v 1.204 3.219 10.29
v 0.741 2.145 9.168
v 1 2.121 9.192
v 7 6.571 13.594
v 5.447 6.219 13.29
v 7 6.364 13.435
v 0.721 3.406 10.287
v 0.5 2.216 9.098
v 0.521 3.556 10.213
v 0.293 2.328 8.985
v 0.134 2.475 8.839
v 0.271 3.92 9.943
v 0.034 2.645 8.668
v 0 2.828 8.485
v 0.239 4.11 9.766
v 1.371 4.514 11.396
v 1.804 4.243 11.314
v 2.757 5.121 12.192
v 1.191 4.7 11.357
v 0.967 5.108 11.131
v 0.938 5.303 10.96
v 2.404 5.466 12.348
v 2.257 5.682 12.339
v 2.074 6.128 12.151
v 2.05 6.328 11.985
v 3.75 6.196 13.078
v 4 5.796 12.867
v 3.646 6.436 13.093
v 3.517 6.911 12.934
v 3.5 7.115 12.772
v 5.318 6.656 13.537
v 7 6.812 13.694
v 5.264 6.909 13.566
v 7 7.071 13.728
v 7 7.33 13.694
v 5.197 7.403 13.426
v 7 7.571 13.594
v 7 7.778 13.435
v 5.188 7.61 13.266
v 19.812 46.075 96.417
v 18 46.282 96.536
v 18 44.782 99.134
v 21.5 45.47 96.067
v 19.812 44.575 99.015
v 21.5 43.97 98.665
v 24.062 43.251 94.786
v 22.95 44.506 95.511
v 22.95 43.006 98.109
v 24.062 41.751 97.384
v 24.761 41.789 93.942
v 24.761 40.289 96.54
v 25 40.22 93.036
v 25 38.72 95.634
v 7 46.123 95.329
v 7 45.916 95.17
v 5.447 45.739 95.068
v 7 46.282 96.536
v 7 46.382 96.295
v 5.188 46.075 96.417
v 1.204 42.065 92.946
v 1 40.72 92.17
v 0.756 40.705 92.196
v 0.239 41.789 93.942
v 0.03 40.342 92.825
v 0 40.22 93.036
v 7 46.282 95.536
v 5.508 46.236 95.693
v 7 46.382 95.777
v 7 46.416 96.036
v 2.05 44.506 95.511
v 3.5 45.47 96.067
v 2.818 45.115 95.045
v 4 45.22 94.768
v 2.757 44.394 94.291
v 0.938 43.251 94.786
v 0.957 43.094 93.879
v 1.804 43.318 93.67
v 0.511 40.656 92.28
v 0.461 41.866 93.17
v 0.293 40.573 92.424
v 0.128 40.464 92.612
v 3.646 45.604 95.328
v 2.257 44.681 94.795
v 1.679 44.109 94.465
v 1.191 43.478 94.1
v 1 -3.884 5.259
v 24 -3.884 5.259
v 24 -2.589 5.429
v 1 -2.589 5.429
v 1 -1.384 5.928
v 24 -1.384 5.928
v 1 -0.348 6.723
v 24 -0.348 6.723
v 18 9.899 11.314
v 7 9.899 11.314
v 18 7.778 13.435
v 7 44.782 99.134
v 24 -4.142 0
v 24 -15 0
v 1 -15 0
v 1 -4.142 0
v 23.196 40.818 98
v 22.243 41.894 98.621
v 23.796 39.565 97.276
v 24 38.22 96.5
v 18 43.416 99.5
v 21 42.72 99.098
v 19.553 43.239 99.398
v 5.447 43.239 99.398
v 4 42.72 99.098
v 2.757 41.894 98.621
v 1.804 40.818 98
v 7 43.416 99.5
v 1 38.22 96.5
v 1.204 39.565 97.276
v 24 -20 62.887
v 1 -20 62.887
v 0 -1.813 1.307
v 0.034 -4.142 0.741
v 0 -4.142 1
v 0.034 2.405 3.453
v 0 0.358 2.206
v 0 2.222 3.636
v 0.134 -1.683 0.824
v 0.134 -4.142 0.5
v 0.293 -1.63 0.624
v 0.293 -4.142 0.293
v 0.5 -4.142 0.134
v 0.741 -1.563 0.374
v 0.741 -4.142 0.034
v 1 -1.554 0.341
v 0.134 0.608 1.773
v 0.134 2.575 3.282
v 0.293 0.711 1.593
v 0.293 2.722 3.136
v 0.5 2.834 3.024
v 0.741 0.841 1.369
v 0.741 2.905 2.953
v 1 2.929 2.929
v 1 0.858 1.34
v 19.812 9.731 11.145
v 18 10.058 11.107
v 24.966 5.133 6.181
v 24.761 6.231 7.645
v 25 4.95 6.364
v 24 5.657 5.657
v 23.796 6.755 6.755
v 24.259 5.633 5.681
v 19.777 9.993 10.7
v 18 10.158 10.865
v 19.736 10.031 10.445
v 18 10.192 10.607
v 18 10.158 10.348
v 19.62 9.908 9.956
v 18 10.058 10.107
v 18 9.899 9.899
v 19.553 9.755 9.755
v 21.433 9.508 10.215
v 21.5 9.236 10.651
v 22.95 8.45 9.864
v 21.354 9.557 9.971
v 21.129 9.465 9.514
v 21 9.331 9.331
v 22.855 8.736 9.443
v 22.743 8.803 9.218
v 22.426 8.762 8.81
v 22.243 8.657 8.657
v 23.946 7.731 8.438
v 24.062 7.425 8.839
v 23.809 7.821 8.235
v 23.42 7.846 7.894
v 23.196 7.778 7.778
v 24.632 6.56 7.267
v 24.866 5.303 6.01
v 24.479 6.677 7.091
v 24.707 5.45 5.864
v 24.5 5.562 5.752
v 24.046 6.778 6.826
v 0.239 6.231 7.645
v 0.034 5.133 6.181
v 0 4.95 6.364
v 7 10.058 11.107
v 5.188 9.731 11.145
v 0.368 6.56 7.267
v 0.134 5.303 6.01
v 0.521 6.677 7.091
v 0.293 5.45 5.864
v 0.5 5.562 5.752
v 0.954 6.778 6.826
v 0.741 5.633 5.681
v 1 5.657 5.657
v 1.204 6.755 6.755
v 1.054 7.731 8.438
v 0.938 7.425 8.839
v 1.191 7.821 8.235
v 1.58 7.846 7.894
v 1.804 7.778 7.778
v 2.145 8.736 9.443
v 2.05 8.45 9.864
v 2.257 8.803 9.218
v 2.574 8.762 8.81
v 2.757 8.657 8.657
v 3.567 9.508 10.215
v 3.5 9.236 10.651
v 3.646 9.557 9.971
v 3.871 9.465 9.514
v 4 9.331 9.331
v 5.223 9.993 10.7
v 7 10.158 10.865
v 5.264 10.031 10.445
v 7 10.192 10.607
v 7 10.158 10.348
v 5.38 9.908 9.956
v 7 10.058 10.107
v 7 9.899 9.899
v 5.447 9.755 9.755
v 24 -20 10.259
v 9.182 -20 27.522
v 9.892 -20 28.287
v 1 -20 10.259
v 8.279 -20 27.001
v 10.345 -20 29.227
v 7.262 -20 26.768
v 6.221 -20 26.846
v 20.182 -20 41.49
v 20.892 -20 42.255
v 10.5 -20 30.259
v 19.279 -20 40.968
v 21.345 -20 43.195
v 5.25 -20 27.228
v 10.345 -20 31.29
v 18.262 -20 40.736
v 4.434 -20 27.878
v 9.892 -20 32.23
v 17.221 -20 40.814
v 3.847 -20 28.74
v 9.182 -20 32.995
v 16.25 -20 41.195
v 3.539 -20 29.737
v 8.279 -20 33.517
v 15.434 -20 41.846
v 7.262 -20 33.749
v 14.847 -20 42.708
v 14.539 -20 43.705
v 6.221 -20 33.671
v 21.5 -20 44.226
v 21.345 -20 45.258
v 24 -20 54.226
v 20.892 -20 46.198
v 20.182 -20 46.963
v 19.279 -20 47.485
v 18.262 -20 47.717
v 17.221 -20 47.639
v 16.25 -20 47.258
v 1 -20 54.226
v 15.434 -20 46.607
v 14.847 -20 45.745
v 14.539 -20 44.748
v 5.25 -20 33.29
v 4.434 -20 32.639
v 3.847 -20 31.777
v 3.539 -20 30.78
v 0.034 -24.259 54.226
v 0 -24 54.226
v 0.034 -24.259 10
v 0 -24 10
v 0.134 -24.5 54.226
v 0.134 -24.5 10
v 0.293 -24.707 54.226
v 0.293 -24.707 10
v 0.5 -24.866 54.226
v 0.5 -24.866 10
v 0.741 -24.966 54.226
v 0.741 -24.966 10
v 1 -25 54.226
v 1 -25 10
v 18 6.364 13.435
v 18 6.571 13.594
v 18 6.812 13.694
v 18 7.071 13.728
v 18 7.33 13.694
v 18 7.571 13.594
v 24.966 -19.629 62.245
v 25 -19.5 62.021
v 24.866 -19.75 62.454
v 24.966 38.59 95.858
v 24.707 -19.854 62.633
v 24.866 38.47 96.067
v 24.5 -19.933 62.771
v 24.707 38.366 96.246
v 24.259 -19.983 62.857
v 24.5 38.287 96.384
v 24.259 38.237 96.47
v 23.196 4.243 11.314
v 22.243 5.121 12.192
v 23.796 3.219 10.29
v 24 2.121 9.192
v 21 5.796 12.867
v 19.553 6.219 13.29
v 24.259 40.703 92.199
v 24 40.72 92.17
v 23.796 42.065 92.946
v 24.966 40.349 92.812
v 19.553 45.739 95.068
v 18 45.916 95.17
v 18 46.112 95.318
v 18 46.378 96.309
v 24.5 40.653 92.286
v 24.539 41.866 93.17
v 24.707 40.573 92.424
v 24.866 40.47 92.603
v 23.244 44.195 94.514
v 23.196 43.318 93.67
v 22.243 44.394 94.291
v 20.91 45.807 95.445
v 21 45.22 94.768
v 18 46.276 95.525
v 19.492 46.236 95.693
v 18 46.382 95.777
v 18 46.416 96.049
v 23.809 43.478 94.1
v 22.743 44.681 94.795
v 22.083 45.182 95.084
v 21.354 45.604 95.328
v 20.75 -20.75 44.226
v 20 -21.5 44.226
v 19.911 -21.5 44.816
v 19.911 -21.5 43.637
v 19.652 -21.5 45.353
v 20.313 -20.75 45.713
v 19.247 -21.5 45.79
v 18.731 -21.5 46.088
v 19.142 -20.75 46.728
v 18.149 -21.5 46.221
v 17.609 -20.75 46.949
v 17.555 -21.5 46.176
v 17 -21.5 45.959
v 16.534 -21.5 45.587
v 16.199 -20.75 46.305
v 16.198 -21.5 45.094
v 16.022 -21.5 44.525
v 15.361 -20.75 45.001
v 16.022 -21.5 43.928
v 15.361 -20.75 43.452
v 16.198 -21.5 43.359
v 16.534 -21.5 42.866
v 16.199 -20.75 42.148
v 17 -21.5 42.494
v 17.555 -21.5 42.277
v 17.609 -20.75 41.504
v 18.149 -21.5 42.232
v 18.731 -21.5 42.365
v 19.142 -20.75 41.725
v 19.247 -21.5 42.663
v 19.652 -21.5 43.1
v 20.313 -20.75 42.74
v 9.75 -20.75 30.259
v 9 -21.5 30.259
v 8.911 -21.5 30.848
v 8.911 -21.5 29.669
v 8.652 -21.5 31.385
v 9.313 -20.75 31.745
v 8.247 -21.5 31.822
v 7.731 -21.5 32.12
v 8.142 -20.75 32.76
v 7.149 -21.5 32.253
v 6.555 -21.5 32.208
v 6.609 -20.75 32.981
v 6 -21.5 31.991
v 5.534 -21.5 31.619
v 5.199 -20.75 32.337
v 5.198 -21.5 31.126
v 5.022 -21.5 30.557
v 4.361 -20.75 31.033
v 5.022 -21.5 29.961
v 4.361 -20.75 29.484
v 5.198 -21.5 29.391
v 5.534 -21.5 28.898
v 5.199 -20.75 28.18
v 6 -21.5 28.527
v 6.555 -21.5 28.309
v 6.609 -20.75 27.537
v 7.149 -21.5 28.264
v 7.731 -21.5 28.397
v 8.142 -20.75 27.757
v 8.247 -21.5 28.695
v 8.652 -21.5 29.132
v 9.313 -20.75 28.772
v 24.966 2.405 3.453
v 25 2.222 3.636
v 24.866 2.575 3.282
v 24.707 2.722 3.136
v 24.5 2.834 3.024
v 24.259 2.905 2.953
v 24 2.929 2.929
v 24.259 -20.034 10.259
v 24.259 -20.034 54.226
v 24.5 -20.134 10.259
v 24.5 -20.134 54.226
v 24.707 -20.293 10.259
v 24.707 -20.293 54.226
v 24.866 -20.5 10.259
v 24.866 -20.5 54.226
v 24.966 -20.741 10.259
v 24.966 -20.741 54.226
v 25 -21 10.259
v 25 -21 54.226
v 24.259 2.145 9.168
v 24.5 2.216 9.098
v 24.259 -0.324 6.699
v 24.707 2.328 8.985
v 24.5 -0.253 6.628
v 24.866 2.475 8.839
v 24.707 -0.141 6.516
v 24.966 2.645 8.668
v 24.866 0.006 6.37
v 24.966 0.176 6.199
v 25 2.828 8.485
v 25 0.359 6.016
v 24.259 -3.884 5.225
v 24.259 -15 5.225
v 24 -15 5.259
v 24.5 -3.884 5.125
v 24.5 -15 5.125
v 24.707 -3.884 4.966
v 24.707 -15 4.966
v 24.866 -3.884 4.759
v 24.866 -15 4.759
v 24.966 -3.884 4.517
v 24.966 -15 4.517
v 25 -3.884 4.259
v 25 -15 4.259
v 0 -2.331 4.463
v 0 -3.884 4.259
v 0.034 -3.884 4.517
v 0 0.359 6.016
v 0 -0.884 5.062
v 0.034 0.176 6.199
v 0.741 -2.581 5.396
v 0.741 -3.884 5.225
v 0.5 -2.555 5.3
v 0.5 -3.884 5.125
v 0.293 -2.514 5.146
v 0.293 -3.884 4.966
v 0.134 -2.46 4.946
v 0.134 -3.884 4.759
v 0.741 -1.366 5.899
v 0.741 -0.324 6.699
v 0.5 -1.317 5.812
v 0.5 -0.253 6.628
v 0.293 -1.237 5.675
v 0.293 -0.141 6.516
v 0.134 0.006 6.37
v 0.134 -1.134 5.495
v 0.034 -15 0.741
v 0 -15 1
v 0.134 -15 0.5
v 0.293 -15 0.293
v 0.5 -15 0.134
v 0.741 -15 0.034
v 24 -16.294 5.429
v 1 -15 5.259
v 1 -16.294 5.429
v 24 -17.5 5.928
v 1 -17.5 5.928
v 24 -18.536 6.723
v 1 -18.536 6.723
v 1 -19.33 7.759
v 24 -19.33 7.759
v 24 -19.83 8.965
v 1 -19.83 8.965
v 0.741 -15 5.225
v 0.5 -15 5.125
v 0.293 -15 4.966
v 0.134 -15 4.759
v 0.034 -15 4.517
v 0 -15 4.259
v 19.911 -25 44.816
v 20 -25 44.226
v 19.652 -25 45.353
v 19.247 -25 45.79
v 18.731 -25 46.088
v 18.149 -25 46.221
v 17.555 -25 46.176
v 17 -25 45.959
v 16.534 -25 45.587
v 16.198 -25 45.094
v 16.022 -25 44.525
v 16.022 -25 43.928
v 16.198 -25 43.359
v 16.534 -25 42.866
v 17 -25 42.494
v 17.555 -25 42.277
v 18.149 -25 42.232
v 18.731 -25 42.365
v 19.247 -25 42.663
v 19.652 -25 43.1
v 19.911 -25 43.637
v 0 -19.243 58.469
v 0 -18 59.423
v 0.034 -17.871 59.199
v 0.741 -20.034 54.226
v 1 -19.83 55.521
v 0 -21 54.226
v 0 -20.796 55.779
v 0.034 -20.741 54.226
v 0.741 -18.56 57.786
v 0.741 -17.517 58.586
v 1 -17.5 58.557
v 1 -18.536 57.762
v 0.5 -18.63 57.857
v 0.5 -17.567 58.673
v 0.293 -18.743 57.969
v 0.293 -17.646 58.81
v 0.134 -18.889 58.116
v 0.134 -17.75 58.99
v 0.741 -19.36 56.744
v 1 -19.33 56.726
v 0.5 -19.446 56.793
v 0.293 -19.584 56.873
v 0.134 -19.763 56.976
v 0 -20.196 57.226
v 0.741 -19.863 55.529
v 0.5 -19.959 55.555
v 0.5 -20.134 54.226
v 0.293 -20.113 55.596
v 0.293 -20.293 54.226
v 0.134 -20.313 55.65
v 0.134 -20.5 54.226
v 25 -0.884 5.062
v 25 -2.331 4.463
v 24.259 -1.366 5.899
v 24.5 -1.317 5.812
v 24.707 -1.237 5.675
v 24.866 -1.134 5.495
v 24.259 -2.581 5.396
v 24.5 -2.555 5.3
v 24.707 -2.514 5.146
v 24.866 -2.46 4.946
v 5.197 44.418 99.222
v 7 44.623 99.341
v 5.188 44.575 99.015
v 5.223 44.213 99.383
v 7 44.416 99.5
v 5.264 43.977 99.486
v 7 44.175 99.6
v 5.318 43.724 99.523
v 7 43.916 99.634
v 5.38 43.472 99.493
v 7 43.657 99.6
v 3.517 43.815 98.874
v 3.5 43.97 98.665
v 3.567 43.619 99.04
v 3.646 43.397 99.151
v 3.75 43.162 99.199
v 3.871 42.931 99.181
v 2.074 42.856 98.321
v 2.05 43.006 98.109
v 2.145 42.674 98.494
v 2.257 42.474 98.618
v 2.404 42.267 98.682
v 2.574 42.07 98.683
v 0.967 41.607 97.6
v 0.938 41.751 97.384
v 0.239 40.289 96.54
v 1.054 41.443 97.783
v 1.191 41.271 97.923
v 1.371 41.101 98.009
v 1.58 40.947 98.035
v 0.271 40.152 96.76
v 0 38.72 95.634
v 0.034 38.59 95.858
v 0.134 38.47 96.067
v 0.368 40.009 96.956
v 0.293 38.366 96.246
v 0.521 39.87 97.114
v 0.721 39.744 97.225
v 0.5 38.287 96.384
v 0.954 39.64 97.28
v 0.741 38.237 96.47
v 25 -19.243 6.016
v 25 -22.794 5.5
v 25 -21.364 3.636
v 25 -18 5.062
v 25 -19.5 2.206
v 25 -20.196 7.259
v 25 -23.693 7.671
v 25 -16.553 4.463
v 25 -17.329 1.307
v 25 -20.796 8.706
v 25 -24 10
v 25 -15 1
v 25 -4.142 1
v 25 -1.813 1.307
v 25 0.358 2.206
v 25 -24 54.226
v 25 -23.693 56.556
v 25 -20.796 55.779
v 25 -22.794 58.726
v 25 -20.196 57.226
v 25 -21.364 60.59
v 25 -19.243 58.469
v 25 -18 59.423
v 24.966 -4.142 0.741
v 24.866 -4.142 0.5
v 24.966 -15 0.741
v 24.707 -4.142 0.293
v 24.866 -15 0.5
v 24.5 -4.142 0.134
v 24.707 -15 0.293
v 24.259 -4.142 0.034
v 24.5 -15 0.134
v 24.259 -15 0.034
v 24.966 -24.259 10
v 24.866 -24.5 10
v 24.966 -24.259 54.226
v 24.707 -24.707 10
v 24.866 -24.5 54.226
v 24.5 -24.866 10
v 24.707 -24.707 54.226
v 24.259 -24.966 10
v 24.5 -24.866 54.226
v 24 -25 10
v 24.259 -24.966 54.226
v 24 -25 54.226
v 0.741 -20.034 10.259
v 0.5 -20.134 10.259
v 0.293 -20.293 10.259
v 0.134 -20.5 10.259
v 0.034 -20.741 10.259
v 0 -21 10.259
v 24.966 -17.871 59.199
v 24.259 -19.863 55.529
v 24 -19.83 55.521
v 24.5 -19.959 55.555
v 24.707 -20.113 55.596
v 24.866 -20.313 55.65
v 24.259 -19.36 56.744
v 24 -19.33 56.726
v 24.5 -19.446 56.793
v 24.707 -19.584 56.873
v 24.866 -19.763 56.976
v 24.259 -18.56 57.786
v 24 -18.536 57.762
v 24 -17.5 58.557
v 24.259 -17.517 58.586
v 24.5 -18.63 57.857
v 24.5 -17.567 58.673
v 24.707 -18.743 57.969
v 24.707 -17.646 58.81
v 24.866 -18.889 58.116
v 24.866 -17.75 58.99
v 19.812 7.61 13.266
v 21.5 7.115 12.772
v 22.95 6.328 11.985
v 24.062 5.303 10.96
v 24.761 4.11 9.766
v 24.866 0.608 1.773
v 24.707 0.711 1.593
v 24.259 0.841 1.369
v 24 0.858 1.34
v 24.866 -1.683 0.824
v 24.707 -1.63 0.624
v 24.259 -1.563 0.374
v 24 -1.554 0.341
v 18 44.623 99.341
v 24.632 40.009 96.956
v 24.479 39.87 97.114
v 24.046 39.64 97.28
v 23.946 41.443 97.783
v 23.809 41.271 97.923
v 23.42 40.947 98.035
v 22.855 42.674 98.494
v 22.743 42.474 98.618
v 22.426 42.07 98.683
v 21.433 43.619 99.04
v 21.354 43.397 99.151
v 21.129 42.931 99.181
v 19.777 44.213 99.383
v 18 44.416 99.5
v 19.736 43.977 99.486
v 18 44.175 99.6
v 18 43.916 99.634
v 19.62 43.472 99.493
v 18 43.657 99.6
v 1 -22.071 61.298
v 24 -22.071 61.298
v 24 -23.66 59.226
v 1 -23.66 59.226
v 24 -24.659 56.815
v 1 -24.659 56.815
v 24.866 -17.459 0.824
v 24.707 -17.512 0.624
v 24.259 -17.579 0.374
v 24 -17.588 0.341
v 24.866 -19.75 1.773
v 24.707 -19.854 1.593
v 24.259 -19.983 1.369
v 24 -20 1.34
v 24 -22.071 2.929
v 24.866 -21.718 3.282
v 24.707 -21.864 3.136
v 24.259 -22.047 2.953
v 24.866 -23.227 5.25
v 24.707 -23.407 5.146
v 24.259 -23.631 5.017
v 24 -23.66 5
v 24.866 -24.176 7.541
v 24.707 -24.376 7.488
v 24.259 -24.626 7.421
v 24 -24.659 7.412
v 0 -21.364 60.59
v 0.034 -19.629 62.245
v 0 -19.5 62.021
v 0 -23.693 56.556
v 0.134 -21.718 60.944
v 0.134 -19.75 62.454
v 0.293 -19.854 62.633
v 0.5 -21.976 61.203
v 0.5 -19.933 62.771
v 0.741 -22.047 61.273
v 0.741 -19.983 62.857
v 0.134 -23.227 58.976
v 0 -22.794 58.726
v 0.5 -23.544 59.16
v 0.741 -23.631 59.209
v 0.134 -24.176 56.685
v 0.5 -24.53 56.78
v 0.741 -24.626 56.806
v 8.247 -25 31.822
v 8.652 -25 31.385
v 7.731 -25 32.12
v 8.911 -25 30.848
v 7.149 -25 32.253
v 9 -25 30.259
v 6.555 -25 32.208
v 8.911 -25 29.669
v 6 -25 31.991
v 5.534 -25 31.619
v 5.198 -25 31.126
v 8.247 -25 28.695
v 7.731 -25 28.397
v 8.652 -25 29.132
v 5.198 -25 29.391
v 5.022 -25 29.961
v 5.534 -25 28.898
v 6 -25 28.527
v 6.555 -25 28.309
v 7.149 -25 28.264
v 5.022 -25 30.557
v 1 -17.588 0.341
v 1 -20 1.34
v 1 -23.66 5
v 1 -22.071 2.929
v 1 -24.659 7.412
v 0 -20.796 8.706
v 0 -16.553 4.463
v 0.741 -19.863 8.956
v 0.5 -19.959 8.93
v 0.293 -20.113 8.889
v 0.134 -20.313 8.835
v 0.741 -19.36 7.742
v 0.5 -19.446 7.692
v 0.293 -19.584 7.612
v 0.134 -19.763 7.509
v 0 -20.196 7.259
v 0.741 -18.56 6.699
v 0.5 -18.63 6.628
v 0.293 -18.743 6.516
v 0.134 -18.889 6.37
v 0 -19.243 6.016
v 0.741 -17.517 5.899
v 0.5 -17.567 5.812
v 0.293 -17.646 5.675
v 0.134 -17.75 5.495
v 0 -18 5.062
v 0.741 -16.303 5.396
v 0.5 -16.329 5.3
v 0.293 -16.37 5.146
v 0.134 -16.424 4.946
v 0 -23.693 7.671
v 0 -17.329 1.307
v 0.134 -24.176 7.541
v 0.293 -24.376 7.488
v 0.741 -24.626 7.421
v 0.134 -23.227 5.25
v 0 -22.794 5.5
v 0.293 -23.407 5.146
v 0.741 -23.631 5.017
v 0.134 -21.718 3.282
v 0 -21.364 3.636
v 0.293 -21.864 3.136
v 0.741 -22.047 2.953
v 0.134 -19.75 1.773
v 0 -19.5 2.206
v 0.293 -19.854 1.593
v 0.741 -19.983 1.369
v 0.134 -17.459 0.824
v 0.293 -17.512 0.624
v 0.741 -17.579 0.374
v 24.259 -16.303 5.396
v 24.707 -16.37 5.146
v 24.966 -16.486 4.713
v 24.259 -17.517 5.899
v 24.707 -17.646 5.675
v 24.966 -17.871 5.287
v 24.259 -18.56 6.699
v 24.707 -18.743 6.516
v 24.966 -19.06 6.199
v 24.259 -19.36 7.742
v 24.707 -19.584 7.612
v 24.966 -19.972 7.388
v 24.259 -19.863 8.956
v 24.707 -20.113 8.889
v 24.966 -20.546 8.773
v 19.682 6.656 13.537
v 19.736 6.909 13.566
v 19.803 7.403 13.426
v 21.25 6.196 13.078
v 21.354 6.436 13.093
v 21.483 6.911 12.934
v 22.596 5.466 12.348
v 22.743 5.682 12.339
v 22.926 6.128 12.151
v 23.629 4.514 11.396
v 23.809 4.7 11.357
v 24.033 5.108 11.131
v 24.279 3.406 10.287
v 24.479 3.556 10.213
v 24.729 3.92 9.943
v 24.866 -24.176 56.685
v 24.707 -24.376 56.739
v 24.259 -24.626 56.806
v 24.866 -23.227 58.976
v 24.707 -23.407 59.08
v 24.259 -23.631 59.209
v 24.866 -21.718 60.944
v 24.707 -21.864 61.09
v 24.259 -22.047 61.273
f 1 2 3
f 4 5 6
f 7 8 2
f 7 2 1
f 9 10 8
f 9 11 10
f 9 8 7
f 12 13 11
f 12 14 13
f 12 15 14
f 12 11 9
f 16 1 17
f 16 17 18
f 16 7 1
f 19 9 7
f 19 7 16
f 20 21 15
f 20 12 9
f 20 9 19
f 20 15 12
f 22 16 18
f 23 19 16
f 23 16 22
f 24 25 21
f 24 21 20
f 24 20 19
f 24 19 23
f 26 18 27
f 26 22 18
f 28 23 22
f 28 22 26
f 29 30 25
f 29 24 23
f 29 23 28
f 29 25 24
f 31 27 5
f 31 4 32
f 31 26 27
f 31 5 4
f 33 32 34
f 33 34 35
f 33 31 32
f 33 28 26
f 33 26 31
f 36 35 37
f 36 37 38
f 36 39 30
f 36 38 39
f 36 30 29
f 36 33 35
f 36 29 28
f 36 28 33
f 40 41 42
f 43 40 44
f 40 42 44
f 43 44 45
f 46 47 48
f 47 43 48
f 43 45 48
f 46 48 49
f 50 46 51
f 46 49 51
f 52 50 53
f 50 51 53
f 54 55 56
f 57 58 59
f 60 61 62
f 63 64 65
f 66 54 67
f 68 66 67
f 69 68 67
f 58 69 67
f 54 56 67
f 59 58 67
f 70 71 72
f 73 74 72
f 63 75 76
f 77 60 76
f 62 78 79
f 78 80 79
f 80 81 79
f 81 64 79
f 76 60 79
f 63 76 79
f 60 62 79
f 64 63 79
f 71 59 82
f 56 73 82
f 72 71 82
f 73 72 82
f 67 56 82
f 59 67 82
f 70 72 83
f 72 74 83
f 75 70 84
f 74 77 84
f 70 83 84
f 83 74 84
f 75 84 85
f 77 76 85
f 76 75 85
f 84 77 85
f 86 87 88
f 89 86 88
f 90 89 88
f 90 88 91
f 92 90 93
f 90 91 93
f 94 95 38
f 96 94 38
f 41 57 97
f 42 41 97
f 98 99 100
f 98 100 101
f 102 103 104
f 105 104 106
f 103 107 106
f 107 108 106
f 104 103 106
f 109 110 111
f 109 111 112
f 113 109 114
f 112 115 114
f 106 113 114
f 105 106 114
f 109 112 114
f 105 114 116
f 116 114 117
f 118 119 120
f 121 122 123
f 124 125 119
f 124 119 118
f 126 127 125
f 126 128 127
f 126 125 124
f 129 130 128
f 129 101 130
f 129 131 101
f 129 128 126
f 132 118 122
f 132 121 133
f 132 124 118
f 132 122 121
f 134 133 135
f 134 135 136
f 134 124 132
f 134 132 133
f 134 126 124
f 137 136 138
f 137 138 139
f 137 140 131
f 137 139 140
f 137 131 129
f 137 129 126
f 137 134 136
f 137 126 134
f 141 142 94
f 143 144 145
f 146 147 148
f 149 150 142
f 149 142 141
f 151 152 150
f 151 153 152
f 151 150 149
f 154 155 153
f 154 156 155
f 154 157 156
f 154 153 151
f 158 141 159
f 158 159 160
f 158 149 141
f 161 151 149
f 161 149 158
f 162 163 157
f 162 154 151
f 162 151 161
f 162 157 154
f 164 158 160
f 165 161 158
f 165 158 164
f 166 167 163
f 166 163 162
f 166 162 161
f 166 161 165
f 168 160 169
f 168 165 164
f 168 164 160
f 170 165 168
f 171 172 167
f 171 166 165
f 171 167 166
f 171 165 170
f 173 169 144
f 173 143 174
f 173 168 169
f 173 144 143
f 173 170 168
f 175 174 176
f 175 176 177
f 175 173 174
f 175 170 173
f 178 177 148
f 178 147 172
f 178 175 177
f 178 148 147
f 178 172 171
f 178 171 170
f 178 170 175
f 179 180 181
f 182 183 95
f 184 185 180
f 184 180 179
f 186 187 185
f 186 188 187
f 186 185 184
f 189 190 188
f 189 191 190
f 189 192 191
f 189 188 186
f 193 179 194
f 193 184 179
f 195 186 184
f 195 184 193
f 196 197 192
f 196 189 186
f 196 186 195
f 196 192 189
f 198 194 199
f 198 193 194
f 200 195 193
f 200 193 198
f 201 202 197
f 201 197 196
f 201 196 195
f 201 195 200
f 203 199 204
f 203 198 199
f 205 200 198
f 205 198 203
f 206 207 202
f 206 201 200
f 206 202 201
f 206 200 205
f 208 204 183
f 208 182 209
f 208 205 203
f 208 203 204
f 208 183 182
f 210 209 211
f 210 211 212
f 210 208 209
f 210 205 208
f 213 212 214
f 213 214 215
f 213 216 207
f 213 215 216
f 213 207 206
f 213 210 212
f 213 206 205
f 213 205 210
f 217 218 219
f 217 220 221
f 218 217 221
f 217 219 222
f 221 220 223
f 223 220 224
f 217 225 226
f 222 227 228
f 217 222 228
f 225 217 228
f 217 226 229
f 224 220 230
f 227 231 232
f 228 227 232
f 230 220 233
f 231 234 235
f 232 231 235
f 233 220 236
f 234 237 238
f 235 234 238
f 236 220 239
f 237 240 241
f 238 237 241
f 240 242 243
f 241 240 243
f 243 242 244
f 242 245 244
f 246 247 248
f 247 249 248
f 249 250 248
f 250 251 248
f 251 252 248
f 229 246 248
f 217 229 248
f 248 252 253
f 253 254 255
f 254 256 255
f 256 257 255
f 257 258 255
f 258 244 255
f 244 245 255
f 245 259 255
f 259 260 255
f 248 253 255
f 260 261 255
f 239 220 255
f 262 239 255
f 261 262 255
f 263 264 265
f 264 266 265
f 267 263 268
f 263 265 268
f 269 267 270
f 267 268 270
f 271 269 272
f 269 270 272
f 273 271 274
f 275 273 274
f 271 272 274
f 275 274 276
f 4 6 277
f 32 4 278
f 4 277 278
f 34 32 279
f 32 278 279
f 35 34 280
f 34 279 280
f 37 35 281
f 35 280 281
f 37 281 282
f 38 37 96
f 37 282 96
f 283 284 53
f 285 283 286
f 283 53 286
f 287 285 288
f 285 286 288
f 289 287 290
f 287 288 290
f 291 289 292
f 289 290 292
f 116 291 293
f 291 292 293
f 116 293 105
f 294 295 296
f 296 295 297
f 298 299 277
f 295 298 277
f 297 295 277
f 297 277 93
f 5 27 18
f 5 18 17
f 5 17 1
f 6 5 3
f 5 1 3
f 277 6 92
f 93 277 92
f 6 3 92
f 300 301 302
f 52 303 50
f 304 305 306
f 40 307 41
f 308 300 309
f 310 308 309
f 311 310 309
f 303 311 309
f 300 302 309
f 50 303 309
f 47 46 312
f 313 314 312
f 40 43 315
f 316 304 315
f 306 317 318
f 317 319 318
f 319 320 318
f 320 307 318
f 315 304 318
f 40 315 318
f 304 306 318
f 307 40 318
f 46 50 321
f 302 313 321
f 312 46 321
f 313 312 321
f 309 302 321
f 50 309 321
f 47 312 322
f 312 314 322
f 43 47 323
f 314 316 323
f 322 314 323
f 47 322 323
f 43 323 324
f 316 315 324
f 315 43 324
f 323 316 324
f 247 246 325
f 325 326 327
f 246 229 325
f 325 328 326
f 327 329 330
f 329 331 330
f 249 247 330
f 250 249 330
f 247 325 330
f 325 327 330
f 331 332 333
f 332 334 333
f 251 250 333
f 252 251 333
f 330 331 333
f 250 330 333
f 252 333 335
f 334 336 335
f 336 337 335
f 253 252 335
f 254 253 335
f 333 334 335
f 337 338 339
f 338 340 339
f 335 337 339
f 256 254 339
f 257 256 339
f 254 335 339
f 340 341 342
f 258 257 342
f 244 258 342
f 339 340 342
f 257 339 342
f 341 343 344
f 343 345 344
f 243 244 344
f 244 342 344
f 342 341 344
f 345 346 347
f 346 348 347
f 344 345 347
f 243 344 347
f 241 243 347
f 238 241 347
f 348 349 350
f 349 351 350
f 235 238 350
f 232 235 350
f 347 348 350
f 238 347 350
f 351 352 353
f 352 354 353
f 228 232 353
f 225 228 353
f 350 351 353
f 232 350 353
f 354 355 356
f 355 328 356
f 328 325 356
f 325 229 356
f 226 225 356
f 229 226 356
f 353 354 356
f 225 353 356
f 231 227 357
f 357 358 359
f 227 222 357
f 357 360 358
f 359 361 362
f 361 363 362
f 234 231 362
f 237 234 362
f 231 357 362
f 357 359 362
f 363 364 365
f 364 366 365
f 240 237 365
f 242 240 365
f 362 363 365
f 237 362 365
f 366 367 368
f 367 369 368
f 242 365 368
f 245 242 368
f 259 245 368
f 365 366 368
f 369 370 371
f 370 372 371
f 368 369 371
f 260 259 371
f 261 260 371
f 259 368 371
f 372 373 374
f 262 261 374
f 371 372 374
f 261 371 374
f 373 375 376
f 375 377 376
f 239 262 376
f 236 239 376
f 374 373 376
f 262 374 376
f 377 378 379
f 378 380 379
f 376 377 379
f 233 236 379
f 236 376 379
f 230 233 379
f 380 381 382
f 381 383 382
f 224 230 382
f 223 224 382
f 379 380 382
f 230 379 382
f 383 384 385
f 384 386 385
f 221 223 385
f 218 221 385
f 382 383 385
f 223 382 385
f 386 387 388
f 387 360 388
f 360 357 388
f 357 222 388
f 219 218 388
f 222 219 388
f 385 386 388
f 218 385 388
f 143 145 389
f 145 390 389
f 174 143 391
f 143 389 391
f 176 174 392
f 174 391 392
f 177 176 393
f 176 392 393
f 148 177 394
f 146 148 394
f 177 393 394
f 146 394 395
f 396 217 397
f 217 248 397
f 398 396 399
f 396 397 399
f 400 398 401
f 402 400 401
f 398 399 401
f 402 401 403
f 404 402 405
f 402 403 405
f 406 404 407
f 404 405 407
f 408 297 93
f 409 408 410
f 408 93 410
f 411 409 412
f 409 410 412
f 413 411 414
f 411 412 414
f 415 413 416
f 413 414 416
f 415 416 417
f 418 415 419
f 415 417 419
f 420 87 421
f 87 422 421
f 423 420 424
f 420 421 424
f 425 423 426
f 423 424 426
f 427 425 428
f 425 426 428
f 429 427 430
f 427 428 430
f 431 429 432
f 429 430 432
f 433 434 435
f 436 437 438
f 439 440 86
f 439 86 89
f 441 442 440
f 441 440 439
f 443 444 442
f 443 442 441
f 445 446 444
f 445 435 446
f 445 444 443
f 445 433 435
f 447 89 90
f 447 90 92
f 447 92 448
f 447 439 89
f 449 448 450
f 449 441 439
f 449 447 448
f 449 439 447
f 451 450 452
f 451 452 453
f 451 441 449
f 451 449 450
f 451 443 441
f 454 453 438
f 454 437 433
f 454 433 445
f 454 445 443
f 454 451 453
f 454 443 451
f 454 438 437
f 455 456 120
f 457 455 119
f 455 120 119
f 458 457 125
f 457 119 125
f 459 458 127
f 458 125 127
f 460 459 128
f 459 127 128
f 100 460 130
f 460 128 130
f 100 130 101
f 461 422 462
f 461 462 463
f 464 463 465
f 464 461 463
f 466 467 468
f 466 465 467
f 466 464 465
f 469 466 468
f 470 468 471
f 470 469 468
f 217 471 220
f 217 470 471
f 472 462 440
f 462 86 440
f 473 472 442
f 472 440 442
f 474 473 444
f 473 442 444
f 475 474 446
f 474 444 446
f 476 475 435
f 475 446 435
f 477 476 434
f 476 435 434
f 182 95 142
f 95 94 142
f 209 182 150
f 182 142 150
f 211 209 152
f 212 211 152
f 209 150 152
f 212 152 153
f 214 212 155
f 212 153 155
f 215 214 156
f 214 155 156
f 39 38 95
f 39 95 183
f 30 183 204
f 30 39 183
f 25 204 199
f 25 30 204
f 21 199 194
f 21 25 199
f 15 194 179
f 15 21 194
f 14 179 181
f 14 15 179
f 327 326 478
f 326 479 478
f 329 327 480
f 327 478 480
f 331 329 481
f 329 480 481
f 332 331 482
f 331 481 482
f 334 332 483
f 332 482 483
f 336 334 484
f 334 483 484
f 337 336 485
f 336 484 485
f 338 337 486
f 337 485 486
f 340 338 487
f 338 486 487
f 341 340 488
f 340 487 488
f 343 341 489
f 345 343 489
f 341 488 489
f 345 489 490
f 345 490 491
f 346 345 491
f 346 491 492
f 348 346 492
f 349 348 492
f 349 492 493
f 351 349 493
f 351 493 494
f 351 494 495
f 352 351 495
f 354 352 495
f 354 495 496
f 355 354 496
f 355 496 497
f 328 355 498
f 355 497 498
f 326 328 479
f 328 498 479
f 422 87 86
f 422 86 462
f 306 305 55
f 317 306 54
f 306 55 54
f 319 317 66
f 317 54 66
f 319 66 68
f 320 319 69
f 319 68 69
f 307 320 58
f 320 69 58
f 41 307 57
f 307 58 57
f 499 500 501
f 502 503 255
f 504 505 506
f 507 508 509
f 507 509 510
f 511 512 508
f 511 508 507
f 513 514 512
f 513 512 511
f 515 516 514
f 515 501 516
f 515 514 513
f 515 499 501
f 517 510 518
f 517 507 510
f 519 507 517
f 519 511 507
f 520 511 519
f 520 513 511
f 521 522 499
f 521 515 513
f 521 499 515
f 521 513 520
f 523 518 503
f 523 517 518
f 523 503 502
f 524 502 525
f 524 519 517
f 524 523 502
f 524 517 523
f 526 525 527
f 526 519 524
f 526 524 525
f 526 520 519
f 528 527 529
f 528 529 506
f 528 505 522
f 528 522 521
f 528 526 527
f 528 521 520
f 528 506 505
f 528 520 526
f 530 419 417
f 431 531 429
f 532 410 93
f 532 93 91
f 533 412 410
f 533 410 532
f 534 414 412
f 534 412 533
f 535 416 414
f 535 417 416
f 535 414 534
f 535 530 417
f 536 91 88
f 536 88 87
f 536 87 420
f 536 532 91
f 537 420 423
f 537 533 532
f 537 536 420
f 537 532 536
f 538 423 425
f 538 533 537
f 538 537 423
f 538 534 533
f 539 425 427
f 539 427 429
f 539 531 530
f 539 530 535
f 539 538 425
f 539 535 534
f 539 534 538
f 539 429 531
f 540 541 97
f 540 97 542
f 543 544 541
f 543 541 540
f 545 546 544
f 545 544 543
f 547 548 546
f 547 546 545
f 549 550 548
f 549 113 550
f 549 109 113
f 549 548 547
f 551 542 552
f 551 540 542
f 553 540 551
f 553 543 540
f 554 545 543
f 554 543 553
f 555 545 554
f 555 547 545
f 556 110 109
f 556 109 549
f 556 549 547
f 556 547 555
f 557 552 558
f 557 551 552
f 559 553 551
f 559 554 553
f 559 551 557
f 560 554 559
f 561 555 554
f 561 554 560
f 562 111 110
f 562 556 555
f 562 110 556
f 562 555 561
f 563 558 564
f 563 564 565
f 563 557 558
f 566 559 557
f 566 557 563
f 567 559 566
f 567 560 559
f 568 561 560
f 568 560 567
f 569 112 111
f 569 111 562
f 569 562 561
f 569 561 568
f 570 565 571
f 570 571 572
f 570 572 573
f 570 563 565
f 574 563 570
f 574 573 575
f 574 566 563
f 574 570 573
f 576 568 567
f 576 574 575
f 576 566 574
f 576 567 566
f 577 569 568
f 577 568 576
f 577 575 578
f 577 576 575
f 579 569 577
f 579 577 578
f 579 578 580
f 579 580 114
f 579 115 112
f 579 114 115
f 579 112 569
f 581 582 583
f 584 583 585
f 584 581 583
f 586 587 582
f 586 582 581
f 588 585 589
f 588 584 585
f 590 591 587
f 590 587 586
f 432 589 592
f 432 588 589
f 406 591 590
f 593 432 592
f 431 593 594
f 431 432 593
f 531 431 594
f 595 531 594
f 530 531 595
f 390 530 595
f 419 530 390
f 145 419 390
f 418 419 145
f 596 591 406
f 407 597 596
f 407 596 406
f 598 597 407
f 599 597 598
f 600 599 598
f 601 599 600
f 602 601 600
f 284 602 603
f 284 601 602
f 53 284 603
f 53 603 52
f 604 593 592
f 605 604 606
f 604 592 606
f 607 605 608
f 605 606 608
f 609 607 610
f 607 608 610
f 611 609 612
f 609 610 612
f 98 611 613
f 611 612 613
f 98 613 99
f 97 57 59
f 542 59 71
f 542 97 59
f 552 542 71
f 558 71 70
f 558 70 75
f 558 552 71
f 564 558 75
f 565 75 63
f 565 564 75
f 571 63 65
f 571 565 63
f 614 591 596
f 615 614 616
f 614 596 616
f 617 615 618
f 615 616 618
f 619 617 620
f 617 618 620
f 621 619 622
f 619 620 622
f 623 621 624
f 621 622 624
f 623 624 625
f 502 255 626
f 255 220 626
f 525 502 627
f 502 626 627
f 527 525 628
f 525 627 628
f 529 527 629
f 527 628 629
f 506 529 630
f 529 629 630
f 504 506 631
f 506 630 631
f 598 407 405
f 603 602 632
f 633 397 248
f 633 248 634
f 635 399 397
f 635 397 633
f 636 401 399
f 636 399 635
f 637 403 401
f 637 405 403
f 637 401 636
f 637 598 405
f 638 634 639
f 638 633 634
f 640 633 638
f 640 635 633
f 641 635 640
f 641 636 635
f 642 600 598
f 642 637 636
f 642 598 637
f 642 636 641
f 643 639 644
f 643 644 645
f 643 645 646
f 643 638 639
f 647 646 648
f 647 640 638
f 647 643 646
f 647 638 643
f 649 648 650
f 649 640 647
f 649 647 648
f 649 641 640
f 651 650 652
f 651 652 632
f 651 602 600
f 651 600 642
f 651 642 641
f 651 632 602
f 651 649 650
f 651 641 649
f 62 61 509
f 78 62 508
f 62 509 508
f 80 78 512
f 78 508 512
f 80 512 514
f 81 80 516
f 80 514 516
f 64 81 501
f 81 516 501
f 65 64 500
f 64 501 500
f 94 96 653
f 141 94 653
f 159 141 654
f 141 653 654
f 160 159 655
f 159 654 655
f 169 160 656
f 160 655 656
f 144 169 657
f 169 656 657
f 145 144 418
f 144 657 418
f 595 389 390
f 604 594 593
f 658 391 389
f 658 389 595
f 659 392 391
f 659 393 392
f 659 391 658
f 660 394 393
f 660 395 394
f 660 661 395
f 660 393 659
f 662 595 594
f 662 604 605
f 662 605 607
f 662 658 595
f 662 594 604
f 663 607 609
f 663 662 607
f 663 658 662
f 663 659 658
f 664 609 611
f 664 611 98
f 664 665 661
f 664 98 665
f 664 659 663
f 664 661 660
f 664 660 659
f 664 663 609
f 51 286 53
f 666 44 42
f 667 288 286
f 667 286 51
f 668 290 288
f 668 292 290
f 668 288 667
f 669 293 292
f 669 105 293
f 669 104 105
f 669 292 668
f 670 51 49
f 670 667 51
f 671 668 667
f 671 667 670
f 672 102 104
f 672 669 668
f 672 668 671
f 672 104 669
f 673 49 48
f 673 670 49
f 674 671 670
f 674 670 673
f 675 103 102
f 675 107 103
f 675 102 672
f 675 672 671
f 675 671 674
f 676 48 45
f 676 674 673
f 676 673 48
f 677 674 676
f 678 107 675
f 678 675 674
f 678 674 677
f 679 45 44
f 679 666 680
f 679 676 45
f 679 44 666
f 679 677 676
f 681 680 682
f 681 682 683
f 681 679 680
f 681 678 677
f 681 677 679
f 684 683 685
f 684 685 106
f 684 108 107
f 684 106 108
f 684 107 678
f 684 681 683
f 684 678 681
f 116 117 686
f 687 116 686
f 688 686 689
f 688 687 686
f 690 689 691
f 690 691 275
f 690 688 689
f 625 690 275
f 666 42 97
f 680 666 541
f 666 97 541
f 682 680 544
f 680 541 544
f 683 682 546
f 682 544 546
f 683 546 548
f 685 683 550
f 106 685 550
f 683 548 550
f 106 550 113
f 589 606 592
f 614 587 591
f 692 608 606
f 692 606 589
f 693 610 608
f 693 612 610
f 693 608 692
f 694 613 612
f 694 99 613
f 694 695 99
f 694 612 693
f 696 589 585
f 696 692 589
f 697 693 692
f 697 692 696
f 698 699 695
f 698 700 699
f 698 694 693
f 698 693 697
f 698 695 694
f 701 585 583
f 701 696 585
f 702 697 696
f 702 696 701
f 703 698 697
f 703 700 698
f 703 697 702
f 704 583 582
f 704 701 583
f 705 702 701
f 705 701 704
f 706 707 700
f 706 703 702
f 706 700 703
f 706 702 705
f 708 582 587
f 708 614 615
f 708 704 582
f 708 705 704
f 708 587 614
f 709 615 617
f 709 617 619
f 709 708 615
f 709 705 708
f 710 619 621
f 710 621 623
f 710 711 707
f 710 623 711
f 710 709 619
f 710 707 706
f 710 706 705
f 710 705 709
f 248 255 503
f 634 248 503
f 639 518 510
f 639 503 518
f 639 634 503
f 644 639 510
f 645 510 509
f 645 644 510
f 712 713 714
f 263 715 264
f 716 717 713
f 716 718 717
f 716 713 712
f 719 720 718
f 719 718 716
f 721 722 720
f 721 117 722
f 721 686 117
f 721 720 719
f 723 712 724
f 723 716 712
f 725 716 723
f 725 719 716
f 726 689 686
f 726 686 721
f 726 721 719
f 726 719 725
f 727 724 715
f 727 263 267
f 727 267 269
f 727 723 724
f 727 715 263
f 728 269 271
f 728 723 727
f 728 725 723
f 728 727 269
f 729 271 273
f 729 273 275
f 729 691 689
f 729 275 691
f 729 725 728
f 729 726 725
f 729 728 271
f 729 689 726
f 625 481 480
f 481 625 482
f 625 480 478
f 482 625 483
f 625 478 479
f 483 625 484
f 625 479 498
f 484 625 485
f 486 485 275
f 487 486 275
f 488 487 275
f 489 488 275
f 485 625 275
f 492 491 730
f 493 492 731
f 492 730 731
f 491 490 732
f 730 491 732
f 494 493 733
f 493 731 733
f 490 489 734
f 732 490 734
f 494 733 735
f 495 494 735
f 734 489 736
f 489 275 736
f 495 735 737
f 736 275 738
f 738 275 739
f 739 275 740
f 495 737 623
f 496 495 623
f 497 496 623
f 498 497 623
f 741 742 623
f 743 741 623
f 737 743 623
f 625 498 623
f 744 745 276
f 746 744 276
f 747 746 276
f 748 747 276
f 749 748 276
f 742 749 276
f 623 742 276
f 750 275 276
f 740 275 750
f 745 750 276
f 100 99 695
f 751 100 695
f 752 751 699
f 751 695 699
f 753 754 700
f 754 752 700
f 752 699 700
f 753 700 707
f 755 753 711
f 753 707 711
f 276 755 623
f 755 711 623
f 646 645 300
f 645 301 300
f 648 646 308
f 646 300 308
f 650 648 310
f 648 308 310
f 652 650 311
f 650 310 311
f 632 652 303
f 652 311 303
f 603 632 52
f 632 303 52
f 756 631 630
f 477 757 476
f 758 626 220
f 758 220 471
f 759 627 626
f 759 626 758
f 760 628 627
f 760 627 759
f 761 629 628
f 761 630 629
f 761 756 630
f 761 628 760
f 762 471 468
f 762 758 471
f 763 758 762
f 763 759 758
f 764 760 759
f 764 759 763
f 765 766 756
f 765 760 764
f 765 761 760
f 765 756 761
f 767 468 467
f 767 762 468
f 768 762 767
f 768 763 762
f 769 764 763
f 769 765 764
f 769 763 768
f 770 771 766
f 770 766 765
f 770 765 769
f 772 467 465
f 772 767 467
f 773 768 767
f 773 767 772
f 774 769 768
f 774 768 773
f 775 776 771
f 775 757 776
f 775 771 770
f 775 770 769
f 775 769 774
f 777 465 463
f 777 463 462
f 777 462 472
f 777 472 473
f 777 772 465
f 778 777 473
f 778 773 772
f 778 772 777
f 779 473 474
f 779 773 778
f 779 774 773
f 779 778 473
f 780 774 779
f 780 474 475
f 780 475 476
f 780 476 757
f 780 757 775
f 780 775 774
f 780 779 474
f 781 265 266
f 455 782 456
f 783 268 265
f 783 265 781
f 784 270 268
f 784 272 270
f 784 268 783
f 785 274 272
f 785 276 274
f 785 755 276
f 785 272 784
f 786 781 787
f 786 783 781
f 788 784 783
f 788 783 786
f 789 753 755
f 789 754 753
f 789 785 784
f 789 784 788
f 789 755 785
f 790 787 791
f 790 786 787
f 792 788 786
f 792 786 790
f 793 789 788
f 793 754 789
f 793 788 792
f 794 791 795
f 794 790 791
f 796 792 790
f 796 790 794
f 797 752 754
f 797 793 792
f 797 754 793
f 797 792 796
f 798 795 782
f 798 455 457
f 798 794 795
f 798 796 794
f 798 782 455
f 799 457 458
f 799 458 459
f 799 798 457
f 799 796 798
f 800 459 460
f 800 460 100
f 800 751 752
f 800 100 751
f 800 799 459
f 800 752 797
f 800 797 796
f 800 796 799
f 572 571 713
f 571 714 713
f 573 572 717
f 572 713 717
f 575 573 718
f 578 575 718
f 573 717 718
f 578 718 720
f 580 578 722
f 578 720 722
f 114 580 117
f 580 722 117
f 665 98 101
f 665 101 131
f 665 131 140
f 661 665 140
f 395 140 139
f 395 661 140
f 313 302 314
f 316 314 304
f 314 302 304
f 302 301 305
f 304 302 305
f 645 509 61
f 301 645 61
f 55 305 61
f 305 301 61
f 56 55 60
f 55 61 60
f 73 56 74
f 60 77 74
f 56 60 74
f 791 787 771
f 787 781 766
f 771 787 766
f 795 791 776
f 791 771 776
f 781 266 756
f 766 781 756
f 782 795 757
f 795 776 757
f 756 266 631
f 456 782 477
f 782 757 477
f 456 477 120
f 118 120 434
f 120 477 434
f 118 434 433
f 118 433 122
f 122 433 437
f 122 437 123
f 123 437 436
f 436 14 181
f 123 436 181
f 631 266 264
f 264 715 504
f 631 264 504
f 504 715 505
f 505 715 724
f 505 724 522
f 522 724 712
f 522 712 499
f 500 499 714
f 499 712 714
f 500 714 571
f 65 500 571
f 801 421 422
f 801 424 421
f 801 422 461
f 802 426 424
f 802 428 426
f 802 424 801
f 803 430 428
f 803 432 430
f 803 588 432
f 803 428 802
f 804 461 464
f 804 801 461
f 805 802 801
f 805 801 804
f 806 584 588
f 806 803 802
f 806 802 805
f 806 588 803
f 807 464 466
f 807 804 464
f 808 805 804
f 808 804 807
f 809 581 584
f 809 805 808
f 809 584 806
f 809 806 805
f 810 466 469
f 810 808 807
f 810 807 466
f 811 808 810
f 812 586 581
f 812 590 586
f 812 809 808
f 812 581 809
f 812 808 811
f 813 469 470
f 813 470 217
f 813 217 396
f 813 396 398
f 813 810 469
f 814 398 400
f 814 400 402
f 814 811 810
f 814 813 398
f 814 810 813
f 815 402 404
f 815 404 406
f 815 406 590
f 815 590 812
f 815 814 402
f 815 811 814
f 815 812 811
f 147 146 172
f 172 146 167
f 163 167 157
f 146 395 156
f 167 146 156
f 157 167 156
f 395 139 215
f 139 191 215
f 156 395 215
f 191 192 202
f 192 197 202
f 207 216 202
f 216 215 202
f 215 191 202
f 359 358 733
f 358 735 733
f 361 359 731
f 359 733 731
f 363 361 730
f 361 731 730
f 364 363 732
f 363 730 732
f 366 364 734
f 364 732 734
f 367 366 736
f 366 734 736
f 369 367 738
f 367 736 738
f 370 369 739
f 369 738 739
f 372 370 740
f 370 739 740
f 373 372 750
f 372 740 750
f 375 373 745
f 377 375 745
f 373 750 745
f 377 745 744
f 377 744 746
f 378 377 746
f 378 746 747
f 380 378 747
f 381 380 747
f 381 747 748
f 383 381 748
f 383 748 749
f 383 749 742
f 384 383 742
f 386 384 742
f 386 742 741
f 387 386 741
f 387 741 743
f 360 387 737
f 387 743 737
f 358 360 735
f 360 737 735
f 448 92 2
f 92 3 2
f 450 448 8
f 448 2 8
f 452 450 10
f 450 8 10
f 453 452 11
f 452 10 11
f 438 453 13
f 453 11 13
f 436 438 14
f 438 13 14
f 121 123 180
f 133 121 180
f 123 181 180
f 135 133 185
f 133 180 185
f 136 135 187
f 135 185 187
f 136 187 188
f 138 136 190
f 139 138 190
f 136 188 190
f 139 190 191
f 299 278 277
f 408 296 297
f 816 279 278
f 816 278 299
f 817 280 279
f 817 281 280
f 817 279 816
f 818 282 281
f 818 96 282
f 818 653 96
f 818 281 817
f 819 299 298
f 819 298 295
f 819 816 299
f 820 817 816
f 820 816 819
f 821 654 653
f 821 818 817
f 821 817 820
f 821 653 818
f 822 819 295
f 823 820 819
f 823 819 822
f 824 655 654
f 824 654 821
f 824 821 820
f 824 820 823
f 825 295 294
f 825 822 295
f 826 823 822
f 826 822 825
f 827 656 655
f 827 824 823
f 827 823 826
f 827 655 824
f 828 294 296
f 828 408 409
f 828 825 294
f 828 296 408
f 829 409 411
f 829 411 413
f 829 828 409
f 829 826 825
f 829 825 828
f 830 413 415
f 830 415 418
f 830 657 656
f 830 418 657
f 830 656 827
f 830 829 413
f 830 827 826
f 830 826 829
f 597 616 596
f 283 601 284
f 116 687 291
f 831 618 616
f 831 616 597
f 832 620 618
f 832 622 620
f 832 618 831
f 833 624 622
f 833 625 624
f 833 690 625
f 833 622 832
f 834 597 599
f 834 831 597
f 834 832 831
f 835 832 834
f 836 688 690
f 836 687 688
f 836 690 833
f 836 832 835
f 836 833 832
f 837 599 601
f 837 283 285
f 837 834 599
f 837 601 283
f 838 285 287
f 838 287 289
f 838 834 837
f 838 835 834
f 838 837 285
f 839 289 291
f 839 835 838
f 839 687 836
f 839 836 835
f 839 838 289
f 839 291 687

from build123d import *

# Parameters (mm, degrees)
F1_DEPTH        = 25
F2_R            = 7
F3_R            = 5
F4_R            = 10
F5_R            = 5
F6_R            = 10
F7_R            = 10
F8_R            = 1
F9_R            = 5
F10_R           = 1
F12_D           = 4
F12_CSINK_D     = 7
F12_CSINK_ANGLE = 90


with BuildPart() as f1:
    # F0 (on Right) → F1 (new body)
    with BuildSketch(Plane.YZ):
        Polygon((-25, 60), (-25, 0), (0, 0), (10.606602, 10.606602), (7.071068, 14.142136), (-1.812448, 5.25862), (-20, 5.25862), (-20, 57.113249), (46.782032, 95.669873), (44.282032, 100), align=None)
    extrude(amount=F1_DEPTH)

    # F2
    f2_edges = [f1.edges().sort_by_distance(p)[0] for p in [
        (25, 8.838835, 12.374369),
        (0, 8.838835, 12.374369),
        (25, 45.532032, 97.834936),
        (0, 45.532032, 97.834936),
    ]]
    fillet(f2_edges, radius=F2_R)

    # F3
    f3_edges = [f1.edges().sort_by_distance(p)[0] for p in [
        (12.5, -20, 57.113249),
    ]]
    fillet(f3_edges, radius=F3_R)

    # F4
    f4_edges = [f1.edges().sort_by_distance(p)[0] for p in [
        (12.5, -25, 60),
    ]]
    fillet(f4_edges, radius=F4_R)

    # F5
    f5_edges = [f1.edges().sort_by_distance(p)[0] for p in [
        (12.5, -1.812448, 5.25862),
    ]]
    fillet(f5_edges, radius=F5_R)

    # F6
    f6_edges = [f1.edges().sort_by_distance(p)[0] for p in [
        (12.5, -25, 0),
    ]]
    fillet(f6_edges, radius=F6_R)

    # F7
    f7_edges = [f1.edges().sort_by_distance(p)[0] for p in [
        (12.5, 0, 0),
    ]]
    fillet(f7_edges, radius=F7_R)

    # F8
    f8_edges = [f1.edges().sort_by_distance(p)[0] for p in [
        (0, -25, 32.113249),
    ]]
    fillet(f8_edges, radius=F8_R)

    # F9
    f9_edges = [f1.edges().sort_by_distance(p)[0] for p in [
        (12.5, -20, 5.25862),
    ]]
    fillet(f9_edges, radius=F9_R)

    # F10
    f10_edges = [f1.edges().sort_by_distance(p)[0] for p in [
        (25, -20, 32.242559),
    ]]
    fillet(f10_edges, radius=F10_R)

    # F12 (through all)
    with Locations(Plane(origin=(0, -20, 0), x_dir=(-1, 0, 0), z_dir=(0, 1, 0))):
        with Locations((-18, 44.226497), (-7, 30.25862)):
            CounterSinkHole(F12_D / 2, F12_CSINK_D / 2, counter_sink_angle=F12_CSINK_ANGLE)


solid = f1.part
